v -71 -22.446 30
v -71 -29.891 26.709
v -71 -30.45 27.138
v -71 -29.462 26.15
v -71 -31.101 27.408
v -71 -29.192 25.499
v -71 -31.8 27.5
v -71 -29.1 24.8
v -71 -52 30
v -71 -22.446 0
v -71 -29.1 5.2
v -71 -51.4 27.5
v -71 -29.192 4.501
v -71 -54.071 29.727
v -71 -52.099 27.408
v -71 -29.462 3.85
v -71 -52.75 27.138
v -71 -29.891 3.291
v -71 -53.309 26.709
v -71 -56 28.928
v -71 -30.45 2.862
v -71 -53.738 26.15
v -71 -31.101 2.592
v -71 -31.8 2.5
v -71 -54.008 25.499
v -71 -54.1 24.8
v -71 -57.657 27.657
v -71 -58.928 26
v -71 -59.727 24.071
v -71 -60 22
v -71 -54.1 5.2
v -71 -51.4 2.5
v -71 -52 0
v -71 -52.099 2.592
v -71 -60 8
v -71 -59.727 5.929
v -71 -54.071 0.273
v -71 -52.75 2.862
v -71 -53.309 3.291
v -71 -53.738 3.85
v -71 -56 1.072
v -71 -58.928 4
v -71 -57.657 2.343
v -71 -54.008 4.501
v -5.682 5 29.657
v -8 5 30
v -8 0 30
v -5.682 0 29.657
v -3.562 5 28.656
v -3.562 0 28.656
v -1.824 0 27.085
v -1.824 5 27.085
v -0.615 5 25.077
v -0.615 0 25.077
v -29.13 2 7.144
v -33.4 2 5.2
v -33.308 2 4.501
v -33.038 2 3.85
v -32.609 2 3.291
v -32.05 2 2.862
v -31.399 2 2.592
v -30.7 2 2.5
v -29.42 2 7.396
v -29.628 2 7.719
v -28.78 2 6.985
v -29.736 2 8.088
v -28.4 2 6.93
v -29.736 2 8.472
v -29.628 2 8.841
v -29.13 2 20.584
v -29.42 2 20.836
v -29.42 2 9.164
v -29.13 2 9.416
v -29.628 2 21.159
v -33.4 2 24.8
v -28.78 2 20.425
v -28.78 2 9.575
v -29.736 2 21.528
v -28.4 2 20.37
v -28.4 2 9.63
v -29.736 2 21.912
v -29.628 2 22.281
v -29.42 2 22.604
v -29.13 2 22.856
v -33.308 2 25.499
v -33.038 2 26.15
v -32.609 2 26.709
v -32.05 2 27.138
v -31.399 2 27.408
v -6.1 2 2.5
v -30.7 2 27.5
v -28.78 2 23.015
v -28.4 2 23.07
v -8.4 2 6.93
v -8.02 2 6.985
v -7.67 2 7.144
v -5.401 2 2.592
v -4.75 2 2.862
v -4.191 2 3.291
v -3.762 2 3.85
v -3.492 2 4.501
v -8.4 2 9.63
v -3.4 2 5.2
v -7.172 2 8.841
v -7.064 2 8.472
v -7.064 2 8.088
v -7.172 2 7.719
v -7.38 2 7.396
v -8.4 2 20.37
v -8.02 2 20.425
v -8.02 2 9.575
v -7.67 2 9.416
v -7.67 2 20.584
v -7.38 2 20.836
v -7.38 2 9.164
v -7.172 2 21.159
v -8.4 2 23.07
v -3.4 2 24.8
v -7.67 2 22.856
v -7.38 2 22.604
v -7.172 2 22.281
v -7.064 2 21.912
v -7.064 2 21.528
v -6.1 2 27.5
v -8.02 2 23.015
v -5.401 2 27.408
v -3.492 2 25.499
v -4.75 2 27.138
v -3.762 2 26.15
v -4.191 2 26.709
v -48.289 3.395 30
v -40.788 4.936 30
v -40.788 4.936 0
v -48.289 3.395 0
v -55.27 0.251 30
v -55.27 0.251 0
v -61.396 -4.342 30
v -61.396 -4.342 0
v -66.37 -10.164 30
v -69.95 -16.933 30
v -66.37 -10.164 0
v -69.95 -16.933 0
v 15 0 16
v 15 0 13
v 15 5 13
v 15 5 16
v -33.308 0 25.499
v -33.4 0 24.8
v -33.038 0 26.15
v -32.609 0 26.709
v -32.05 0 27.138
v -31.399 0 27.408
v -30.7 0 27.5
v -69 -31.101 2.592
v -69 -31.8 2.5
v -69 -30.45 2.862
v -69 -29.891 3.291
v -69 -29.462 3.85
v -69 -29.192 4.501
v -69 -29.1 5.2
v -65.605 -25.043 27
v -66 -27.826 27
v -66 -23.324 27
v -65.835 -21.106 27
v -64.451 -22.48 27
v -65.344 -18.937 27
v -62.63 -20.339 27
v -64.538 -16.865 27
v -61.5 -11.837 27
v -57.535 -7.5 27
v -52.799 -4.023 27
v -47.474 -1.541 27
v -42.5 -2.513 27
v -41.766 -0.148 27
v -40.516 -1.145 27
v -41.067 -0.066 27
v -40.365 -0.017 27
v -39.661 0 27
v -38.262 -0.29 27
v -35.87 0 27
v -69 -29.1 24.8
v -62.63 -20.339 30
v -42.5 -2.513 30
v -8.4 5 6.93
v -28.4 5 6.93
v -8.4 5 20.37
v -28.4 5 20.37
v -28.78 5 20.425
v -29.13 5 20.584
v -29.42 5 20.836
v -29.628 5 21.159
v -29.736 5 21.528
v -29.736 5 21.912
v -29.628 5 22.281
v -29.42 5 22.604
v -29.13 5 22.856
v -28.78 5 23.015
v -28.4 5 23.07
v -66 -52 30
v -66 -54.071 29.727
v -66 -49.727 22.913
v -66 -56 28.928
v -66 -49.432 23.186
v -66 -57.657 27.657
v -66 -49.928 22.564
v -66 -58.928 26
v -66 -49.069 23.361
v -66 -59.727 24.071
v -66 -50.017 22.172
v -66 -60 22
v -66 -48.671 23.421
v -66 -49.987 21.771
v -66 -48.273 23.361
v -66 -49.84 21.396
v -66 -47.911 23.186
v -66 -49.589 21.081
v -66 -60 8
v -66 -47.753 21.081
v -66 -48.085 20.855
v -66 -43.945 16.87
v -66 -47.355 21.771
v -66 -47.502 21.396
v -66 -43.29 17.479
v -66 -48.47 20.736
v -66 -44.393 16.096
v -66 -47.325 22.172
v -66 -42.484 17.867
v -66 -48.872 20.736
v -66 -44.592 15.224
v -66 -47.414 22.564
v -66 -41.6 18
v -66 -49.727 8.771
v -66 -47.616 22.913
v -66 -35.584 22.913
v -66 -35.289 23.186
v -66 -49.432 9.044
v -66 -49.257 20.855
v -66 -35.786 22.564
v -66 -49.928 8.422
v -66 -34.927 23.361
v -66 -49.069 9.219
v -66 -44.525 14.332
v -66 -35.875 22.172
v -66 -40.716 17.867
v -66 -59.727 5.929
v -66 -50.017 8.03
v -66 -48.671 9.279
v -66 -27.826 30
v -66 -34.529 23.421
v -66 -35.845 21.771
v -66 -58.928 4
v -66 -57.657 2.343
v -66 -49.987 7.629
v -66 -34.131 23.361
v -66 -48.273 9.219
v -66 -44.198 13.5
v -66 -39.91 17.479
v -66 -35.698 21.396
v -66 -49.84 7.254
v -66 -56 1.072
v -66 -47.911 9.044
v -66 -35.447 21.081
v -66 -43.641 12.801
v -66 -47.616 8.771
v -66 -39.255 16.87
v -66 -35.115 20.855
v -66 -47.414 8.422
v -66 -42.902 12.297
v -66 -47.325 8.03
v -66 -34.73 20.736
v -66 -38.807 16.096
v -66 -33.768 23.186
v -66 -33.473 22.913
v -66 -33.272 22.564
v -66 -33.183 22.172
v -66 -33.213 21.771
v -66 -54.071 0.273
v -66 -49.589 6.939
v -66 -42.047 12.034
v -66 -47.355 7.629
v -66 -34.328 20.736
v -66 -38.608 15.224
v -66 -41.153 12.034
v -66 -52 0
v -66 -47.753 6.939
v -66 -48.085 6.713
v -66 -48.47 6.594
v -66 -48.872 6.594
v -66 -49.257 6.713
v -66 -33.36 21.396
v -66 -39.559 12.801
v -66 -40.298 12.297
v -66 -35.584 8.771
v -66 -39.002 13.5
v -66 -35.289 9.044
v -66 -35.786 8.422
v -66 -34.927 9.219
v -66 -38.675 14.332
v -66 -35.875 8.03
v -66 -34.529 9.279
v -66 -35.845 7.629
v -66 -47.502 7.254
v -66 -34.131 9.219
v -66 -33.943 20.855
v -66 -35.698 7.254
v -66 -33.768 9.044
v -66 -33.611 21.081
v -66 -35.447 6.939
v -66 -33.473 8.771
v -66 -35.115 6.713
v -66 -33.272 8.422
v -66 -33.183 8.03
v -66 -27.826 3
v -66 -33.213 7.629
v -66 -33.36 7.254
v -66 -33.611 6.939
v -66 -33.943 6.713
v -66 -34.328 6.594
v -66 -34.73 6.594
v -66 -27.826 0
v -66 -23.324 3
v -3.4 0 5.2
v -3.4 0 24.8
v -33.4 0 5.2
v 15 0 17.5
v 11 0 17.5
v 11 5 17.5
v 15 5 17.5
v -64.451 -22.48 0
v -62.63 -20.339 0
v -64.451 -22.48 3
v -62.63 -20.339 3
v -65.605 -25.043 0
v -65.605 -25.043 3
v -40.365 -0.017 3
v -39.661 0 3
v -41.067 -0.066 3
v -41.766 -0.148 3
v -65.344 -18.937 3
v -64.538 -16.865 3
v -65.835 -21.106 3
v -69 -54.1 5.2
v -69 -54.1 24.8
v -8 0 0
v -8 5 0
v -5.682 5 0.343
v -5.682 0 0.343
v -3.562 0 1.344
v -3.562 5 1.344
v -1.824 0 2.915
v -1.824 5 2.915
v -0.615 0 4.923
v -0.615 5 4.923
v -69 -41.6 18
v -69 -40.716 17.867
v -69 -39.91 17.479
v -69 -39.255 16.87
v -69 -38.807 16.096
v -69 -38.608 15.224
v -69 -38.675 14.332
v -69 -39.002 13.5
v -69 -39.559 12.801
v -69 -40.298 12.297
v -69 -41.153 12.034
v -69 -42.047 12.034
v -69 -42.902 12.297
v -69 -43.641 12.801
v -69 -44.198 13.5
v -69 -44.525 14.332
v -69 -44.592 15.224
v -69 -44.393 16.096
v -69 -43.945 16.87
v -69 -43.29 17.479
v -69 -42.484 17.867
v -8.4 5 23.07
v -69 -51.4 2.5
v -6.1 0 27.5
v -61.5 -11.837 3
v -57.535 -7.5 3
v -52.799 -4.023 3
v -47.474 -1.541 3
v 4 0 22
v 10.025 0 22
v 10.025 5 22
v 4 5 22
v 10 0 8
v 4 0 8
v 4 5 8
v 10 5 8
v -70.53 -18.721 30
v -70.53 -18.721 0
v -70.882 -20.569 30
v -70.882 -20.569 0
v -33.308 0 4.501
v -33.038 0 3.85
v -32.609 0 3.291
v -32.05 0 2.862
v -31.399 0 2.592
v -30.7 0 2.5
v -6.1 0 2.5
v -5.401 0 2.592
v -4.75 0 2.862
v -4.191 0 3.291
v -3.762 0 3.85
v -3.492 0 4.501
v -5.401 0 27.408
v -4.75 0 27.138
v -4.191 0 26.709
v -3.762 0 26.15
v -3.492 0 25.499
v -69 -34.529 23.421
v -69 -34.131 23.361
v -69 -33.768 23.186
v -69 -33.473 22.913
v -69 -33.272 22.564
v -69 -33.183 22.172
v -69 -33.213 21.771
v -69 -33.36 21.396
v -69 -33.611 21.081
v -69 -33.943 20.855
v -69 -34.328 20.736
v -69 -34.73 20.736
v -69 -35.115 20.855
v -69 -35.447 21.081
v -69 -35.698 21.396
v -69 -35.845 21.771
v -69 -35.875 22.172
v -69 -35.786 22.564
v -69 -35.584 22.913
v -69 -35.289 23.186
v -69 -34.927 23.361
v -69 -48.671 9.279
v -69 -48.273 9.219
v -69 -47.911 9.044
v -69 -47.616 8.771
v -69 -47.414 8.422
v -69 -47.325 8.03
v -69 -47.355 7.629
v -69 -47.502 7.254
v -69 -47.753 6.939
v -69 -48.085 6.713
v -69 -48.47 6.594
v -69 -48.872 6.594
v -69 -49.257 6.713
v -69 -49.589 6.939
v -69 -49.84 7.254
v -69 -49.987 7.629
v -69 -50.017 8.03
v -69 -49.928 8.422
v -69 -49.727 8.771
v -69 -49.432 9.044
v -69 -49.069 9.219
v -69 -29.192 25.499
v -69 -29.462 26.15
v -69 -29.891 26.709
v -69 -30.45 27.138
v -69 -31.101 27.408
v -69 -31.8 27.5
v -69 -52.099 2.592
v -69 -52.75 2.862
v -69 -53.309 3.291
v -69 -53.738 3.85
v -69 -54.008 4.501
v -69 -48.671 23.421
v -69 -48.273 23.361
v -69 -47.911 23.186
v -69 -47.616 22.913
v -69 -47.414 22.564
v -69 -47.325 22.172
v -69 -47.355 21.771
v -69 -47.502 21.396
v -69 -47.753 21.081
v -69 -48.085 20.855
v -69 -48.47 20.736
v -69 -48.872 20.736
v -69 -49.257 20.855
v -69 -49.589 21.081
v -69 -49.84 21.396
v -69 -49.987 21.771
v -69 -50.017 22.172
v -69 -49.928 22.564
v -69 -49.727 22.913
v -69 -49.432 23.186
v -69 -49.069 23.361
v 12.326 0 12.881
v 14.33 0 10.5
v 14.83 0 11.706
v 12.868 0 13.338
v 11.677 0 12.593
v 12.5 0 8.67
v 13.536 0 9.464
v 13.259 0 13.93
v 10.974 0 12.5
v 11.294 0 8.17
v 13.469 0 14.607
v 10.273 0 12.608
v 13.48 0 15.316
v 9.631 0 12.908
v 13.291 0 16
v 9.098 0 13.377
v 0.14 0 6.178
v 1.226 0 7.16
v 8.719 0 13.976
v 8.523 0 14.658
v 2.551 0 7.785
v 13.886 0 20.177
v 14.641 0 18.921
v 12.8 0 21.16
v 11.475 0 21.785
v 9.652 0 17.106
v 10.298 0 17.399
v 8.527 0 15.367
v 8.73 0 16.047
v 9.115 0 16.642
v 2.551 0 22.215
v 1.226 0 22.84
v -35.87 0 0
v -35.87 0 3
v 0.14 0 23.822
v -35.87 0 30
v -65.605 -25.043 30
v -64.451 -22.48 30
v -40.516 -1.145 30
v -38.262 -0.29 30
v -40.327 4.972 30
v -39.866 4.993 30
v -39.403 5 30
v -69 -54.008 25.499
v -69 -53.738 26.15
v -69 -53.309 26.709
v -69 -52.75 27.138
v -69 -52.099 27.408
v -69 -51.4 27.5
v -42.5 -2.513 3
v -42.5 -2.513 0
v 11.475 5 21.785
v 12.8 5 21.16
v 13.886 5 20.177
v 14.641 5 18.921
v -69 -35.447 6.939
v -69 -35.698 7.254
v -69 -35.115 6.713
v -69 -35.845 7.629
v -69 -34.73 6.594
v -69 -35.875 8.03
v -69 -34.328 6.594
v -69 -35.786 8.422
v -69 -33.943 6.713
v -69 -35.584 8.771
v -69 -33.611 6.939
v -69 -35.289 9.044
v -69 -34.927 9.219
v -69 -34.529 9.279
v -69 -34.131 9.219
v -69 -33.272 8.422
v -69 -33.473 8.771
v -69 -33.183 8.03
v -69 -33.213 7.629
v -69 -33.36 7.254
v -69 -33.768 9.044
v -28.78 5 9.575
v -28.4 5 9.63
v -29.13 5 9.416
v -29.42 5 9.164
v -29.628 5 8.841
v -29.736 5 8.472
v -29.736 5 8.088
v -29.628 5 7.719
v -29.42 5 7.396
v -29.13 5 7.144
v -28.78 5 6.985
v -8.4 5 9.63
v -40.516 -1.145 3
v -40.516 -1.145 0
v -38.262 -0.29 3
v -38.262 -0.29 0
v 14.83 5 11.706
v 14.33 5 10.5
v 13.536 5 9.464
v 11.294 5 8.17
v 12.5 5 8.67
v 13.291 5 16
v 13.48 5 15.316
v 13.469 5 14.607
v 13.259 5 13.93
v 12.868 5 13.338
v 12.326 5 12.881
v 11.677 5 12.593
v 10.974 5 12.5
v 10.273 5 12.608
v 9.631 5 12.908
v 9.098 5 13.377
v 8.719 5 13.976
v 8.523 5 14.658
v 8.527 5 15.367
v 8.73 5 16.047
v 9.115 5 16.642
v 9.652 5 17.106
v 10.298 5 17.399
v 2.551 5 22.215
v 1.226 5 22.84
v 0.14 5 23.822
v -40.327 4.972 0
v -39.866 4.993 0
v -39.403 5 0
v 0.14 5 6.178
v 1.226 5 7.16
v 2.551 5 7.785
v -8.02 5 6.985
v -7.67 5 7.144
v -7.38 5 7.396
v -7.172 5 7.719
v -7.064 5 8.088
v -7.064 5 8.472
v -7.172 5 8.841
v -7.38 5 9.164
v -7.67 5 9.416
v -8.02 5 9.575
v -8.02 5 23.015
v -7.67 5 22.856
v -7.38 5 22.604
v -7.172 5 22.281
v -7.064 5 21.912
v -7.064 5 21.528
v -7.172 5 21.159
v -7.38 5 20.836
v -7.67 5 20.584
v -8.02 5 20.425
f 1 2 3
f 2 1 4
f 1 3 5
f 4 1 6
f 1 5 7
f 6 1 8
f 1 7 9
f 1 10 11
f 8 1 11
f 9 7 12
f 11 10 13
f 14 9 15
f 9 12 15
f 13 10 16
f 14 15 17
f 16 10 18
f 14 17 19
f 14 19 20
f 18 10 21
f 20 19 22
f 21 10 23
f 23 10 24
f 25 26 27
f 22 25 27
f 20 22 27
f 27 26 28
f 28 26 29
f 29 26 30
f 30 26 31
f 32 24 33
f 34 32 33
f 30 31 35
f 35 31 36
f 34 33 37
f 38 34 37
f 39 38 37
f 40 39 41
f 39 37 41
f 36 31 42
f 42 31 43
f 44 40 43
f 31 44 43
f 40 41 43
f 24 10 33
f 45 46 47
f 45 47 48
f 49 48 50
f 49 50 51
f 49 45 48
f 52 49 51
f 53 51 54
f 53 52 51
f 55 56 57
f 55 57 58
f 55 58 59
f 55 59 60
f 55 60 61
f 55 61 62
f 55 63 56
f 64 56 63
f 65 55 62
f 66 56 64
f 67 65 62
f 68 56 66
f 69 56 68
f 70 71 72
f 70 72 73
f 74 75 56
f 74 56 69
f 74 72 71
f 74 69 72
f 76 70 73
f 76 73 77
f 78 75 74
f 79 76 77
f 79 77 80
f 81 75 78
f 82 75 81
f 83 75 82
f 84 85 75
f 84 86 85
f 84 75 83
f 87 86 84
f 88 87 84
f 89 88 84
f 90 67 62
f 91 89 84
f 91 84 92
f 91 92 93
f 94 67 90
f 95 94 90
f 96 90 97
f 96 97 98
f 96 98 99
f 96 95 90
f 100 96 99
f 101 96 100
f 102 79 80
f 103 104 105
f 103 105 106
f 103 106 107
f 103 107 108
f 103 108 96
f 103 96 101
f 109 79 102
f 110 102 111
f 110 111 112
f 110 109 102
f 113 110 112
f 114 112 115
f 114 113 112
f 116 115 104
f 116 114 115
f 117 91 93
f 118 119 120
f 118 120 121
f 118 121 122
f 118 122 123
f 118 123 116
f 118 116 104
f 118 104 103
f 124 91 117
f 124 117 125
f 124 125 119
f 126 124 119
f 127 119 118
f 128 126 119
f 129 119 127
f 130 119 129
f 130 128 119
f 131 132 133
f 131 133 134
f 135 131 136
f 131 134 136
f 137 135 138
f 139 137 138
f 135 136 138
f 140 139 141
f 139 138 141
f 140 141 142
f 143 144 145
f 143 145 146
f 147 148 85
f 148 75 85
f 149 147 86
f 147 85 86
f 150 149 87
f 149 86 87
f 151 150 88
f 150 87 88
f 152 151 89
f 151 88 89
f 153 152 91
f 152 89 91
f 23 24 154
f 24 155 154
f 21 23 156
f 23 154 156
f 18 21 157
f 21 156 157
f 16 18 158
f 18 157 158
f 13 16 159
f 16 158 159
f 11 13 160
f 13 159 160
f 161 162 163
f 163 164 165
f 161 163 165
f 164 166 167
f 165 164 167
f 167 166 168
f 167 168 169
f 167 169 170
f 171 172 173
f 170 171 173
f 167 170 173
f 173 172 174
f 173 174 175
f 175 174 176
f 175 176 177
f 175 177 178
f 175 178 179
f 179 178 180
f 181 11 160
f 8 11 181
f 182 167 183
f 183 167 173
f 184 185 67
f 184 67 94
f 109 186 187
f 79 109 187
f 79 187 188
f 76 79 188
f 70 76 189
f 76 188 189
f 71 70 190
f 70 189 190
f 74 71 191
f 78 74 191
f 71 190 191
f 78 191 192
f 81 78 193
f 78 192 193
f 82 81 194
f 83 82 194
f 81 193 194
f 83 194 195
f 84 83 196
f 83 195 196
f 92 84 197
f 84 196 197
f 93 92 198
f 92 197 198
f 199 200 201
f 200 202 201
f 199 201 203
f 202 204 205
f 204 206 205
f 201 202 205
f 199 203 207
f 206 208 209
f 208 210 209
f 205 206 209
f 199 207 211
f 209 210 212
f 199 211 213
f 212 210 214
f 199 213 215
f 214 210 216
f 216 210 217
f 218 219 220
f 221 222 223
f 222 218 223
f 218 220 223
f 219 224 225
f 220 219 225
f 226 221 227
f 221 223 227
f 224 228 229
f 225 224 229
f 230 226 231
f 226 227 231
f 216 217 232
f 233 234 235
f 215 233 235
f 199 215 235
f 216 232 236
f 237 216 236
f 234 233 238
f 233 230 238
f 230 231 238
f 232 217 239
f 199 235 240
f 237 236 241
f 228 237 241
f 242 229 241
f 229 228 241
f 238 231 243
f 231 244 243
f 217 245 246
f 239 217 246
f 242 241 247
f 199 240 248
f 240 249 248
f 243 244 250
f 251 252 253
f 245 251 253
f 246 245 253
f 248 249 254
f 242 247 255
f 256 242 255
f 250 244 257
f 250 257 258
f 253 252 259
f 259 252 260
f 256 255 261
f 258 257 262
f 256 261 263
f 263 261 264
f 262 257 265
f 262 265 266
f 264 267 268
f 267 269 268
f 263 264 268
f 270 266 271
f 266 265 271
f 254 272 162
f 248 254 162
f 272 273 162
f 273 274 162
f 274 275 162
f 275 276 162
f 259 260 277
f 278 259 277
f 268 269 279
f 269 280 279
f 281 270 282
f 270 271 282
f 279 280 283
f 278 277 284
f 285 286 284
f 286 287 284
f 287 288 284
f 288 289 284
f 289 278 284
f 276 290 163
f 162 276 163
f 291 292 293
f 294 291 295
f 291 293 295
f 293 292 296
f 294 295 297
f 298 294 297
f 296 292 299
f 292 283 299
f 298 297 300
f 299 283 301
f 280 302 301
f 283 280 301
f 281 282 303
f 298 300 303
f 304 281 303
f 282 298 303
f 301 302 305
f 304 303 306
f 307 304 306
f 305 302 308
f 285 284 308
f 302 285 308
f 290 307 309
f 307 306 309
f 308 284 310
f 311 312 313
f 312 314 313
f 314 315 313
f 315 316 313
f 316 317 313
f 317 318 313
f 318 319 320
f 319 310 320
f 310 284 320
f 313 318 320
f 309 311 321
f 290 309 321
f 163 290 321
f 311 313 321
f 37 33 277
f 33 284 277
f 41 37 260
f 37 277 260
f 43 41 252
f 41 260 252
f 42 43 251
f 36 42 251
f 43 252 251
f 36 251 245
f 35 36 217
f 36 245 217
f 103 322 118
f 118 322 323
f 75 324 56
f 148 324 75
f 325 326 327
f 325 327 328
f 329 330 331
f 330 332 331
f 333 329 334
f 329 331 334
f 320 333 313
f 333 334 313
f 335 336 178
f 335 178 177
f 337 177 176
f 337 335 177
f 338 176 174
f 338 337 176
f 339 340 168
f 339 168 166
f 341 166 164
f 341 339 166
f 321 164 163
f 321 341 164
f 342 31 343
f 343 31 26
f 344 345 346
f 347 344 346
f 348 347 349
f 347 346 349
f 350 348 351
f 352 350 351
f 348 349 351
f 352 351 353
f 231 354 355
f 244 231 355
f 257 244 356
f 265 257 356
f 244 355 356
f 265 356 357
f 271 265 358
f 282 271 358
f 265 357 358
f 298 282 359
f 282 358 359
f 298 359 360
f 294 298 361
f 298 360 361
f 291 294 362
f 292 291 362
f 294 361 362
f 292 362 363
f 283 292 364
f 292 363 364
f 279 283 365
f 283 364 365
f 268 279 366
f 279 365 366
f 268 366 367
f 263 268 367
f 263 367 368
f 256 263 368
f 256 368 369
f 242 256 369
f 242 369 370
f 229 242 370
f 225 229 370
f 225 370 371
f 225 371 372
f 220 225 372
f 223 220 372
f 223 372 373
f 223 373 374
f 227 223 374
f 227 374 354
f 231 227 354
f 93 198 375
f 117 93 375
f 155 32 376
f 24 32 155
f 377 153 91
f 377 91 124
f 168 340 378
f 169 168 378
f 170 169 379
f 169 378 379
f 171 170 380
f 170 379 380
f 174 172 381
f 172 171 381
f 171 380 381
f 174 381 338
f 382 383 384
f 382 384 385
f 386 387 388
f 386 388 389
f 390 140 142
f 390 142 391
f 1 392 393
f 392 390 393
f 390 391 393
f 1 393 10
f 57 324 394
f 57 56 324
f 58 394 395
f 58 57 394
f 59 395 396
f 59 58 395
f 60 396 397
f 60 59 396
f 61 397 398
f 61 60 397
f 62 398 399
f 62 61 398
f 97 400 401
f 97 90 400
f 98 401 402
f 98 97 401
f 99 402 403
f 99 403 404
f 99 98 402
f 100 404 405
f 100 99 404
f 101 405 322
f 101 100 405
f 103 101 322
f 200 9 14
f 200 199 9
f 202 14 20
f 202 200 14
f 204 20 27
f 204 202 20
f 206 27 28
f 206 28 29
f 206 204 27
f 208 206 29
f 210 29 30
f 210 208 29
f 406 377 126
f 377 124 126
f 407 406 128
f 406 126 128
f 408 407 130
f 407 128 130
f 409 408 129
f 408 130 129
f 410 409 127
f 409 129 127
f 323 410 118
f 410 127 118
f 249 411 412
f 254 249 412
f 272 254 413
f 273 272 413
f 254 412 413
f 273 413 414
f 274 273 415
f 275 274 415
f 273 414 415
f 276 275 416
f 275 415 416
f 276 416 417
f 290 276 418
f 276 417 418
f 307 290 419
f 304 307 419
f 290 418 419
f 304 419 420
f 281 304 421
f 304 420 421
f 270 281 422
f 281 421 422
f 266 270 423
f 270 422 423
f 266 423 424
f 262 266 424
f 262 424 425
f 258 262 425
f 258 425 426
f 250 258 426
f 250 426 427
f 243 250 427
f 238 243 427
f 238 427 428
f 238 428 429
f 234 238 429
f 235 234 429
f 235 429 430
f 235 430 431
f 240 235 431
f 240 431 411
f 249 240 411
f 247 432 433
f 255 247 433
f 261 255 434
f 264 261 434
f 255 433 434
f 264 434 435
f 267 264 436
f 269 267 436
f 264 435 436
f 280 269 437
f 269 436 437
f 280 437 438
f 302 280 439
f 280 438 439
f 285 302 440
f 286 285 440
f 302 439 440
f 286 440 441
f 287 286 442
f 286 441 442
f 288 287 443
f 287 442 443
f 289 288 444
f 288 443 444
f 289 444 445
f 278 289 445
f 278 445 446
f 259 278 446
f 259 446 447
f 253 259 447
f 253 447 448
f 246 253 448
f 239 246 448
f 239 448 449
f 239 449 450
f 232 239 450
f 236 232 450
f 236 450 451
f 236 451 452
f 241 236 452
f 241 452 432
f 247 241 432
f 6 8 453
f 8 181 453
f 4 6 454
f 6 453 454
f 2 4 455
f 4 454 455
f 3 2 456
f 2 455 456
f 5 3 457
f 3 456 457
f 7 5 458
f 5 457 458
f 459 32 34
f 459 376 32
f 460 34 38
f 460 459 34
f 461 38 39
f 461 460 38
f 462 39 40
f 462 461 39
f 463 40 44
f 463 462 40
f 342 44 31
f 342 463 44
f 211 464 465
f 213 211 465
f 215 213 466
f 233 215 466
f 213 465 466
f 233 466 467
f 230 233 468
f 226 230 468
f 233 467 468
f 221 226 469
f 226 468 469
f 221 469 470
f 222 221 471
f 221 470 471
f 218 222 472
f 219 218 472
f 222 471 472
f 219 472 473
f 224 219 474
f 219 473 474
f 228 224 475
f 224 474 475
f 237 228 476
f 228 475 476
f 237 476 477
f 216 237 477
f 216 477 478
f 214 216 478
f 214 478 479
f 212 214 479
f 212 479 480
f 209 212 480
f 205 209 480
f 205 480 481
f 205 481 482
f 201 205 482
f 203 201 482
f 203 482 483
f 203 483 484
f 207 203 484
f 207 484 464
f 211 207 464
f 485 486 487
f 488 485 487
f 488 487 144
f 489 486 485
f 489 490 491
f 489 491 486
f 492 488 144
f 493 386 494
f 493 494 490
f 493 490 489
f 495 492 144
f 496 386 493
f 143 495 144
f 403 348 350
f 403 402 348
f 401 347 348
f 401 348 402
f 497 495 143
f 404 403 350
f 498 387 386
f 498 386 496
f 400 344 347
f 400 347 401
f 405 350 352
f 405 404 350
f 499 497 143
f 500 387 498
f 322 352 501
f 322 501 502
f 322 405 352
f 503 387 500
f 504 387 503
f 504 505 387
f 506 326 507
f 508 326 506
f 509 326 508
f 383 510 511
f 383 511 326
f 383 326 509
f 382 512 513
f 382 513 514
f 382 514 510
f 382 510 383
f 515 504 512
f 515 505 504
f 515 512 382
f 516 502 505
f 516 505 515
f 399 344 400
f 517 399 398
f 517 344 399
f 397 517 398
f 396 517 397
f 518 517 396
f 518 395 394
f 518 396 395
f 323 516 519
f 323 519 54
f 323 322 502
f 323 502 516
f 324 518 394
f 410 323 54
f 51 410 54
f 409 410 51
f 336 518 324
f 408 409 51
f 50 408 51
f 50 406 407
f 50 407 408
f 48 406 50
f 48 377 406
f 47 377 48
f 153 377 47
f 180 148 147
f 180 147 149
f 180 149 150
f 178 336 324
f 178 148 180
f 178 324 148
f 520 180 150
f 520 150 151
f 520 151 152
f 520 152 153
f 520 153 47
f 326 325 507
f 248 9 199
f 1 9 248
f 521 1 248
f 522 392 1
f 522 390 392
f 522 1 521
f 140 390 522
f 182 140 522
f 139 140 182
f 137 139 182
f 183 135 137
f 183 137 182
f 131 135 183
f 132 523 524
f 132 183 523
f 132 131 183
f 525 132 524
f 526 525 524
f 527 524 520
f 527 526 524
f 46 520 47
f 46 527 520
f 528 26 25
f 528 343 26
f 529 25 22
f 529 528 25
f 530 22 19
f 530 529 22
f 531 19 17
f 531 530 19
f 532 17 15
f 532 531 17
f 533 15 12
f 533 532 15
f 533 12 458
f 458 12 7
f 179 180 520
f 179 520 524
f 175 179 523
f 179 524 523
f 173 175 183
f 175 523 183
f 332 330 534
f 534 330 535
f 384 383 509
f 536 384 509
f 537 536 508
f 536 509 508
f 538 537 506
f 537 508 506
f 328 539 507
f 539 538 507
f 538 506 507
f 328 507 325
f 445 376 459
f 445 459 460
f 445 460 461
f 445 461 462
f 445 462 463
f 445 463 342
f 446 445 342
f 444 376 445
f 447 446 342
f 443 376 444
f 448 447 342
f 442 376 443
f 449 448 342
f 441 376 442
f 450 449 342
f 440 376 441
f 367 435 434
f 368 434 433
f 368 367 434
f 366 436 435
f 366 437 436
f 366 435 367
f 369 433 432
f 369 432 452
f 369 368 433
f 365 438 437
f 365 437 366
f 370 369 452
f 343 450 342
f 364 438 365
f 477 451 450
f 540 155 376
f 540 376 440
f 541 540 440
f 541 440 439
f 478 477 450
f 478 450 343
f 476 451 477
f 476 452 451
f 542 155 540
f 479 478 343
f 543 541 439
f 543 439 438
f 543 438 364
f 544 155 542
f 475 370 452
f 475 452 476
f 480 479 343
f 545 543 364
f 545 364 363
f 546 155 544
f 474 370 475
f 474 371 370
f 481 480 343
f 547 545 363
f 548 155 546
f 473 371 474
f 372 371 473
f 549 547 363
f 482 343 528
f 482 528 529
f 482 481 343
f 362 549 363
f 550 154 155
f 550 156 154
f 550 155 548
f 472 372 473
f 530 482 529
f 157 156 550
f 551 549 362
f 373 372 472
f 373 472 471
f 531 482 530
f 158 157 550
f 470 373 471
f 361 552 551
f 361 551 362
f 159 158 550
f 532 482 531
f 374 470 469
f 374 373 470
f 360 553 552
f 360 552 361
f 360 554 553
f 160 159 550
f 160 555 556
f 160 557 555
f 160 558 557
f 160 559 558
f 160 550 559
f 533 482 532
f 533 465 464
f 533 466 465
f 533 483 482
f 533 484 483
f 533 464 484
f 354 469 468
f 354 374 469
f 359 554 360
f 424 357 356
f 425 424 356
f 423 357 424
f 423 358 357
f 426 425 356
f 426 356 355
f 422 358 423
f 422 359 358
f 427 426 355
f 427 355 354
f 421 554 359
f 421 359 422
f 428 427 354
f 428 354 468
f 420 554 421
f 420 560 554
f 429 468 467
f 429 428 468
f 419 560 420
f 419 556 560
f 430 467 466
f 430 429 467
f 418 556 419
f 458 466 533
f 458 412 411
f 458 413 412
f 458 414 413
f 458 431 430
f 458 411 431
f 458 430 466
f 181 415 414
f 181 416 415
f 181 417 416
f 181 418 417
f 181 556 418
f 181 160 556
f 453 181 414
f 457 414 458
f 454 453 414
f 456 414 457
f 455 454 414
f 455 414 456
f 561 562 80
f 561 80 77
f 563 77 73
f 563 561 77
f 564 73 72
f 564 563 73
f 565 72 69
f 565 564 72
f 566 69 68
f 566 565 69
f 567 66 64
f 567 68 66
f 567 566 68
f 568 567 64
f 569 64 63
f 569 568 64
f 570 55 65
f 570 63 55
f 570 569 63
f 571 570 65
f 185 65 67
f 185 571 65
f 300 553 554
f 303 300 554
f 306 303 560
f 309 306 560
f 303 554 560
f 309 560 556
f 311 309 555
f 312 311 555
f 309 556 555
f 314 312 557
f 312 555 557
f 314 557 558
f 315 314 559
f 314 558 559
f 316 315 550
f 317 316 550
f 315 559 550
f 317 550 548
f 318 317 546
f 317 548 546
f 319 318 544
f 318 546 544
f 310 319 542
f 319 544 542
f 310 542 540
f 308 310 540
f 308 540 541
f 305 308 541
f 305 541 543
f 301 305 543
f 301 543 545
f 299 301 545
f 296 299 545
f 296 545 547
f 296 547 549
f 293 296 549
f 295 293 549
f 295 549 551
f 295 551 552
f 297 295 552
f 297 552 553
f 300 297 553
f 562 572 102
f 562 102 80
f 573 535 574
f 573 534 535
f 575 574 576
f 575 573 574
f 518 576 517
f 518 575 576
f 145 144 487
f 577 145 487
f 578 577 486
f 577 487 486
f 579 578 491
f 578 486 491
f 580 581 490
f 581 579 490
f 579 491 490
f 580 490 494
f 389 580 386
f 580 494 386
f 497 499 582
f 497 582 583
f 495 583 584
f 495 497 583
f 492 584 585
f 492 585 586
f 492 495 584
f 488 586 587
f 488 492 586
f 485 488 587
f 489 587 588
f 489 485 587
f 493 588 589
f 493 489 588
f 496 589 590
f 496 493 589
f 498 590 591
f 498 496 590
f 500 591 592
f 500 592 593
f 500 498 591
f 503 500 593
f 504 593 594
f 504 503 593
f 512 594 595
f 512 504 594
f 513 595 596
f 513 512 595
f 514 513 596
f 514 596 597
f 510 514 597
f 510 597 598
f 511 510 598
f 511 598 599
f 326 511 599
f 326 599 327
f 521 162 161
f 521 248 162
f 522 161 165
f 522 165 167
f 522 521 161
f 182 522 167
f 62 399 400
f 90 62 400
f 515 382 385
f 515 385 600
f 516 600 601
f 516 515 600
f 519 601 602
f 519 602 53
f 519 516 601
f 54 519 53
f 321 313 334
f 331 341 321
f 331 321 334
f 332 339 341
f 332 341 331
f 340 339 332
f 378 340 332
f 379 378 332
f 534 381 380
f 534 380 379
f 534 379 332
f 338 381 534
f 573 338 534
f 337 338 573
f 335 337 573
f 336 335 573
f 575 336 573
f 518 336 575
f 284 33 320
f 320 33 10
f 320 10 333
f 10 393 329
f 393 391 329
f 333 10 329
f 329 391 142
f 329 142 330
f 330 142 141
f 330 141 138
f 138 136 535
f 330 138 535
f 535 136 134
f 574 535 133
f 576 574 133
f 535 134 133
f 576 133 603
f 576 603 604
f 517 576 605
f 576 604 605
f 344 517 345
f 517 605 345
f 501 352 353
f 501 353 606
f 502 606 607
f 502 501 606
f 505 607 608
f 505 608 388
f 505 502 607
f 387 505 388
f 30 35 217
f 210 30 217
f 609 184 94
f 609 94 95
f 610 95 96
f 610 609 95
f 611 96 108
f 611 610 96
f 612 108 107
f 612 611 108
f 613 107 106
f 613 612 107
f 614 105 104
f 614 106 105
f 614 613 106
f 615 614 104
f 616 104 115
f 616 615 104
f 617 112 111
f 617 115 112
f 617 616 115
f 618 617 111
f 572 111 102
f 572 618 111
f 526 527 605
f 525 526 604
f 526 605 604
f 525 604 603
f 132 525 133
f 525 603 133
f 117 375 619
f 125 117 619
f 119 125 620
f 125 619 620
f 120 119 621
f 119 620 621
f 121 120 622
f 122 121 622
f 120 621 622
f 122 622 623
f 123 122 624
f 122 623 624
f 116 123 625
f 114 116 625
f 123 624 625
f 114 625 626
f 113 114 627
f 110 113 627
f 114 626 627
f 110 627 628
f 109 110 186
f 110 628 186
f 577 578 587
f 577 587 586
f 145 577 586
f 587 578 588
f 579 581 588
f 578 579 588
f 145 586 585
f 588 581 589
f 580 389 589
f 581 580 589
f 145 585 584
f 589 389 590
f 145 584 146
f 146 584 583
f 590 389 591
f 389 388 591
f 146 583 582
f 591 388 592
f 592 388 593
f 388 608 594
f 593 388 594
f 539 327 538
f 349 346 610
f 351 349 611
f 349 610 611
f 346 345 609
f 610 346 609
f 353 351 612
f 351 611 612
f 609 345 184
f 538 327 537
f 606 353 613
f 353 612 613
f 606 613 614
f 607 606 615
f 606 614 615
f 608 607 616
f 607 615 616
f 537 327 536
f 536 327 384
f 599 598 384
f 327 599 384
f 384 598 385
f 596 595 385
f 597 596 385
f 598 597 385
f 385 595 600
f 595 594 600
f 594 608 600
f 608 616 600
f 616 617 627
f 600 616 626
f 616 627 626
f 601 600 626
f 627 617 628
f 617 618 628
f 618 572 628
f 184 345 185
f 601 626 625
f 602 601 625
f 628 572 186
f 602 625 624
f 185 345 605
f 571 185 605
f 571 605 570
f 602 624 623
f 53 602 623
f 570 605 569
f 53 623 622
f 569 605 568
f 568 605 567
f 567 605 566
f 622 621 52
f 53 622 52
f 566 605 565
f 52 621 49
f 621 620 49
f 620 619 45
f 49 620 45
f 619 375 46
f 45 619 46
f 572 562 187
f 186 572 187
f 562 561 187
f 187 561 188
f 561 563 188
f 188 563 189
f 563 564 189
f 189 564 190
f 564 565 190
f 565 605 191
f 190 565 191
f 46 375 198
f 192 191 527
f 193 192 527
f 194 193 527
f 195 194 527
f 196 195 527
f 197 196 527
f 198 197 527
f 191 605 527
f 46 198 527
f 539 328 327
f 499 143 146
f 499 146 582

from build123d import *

# Parameters (mm, degrees)
SALIENTE_EXTRUIR1_DEPTH = 30
CORTAR_EXTRUIR1_DEPTH   = 5
CROQUIS3_W              = 30
CROQUIS3_H              = 25
CORTAR_EXTRUIR2_DEPTH   = 2
CROQUIS4_R              = 1.35
CROQUIS4_R_2            = 3
CORTAR_EXTRUIR3_DEPTH   = 5
CROQUIS5_W              = 25
CROQUIS5_H              = 25
CORTAR_EXTRUIR4_DEPTH   = 2
REDONDEO1_R             = 15
REDONDEO2_R             = 8
REDONDEO3_R             = 2.7
SALIENTE_EXTRUIR2_DEPTH = 5
REDONDEO4_R             = 5
SALIENTE_EXTRUIR3_START = -3
SALIENTE_EXTRUIR3_DEPTH = 3
SALIENTE_EXTRUIR4_START = -30
SALIENTE_EXTRUIR4_DEPTH = 3
REDONDEO5_R             = 10


with BuildPart() as part:
    # Croquis1 → Saliente-Extruir1 (new body)
    with BuildSketch(Plane.XY):
        with BuildLine():
            Line((0, 0), (0, 5))
            Line((0, 5), (-40, 5))
            ThreePointArc((-40, 5), (-59.427874629, -2.62943546), (-71, -20))
            Line((-71, -20), (-71, -60))
            Line((-71, -60), (-66, -60))
            Line((-66, -60), (-66, -20.535714286))
            ThreePointArc((-66, -20.535714286), (-56.328368106, -6.472823549), (-40.535714286, 0))
            Line((-40.535714286, 0), (0, 0))
        make_face()
    extrude(amount=SALIENTE_EXTRUIR1_DEPTH)

    # Croquis2 → Cortar-Extruir1 (cut)
    with BuildSketch(Plane(origin=(0, 5, 0), x_dir=(1, 0, 0), z_dir=(0, 1, 0))):
        with BuildLine():
            Line((-18.4, -6.93), (-8.4, -6.93))
            ThreePointArc((-8.4, -6.93), (-7.05, -8.28), (-8.4, -9.63))
            Line((-8.4, -9.63), (-28.4, -9.63))
            ThreePointArc((-28.4, -9.63), (-29.75, -8.28), (-28.4, -6.93))
            Line((-28.4, -6.93), (-18.4, -6.93))
        make_face()
        with BuildLine():
            Line((-8.4, -20.37), (-28.4, -20.37))
            ThreePointArc((-28.4, -20.37), (-29.75, -21.72), (-28.4, -23.07))
            Line((-28.4, -23.07), (-18.4, -23.07))
            Line((-18.4, -23.07), (-8.4, -23.07))
            ThreePointArc((-8.4, -23.07), (-7.05, -21.72), (-8.4, -20.37))
        make_face()
    extrude(amount=-CORTAR_EXTRUIR1_DEPTH, mode=Mode.SUBTRACT)

    # Croquis3 → Cortar-Extruir2 (cut)
    with BuildSketch(Plane.XZ):
        with Locations((-18.4, 15)):
            Rectangle(CROQUIS3_W, CROQUIS3_H)
    extrude(amount=-CORTAR_EXTRUIR2_DEPTH, mode=Mode.SUBTRACT)

    # Croquis4 → Cortar-Extruir3 (cut)
    with BuildSketch(Plane.ZY.offset(71)):
        with Locations((22.071067812, -34.528932188)):
            Circle(CROQUIS4_R)
        with Locations((22.071067812, -48.671067812)):
            Circle(CROQUIS4_R)
        with Locations((7.928932188, -48.671067812)):
            Circle(CROQUIS4_R)
        with Locations((7.928932188, -34.528932188)):
            Circle(CROQUIS4_R)
        with Locations((15, -41.6)):
            Circle(CROQUIS4_R_2)
    extrude(amount=-CORTAR_EXTRUIR3_DEPTH, mode=Mode.SUBTRACT)

    # Croquis5 → Cortar-Extruir4 (cut)
    with BuildSketch(Plane.ZY.offset(71)):
        with Locations((15, -41.6)):
            Rectangle(CROQUIS5_W, CROQUIS5_H)
    extrude(amount=-CORTAR_EXTRUIR4_DEPTH, mode=Mode.SUBTRACT)

    # Redondeo1
    # the kernel refuses this fillet: 15 mm, written as the material it adds along each edge
    with BuildSketch(Plane(origin=(-40.535714286, 0, 0), x_dir=(-0.9928040160487852, -0.11975051447657076, 0), z_dir=(0, 0, 1))) as redondeo1_piece_1:
        with BuildLine():
            CenterArc((0.928120739, 14.996773606), REDONDEO1_R, 263.122295715, 8.066092884)
            Line((-0.868136978, 0.104713365), (0, 0))
            ThreePointArc((0, 0), (0.61960892, -0.006425976), (1.23921784, 0))
        make_face()
    extrude(amount=30)
    with BuildSketch(Plane(origin=(-66, -20.535714286, 0), x_dir=(0, -1, 0), z_dir=(0, 0, 1))) as redondeo1_piece_2:
        with BuildLine():
            CenterArc((2.787806423, 15), REDONDEO1_R, 244.497181261, 25.502818739)
            ThreePointArc((-3.670526079, 1.461538444), (-1.859449277, 0.670027601), (0, 0))
            Line((0, 0), (2.787806423, 0))
        make_face()
    extrude(amount=30)
    # the kernel refuses this fillet: 15 mm, written as the material it takes off along each edge
    with BuildSketch(Plane(origin=(-71, -20, -8.10538424), x_dir=(0, -1, 0), z_dir=(0, 0, 1))) as redondeo1_2_piece_1:
        with BuildLine():
            CenterArc((2.445891068, 15), REDONDEO1_R, 248.435113489, 21.564886511)
            ThreePointArc((-3.067429039, 1.049971276), (-1.545944268, 0.48925715), (0, 0))
            Line((0, 0), (2.445891068, 0))
        make_face()
    extrude(amount=46.210768479, mode=Mode.SUBTRACT)
    with BuildSketch(Plane(origin=(-40, 5, -1.977224952), x_dir=(-0.9967130662310812, -0.08101273729628075, 0), z_dir=(0, 0, 1))) as redondeo1_2_piece_2:
        with BuildLine():
            CenterArc((0.620502289, 14.999032237), REDONDEO1_R, 265.35321973, 5.297627307)
            Line((-0.59468877, 0.048336243), (0, 0))
            ThreePointArc((0, 0), (0.39544499, -0.002246038), (0.790889981, 0))
        make_face()
    extrude(amount=33.954449904, mode=Mode.SUBTRACT)

    # Redondeo2
    redondeo2_edges = [part.edges().sort_by_distance(p)[0] for p in [
        (0, 2.5, 0),
        (-68.5, -60, 30),
        (0, 2.5, 30),
        (-68.5, -60, 0),
    ]]
    fillet(redondeo2_edges, radius=REDONDEO2_R)

    # Redondeo3
    redondeo3_edges = [part.edges().sort_by_distance(p)[0] for p in [
        (-70, -29.1, 27.5),
        (-70, -54.1, 27.5),
        (-70, -54.1, 2.5),
        (-70, -29.1, 2.5),
        (-3.4, 1, 27.5),
        (-3.4, 1, 2.5),
        (-33.4, 1, 2.5),
        (-33.4, 1, 27.5),
    ]]
    fillet(redondeo3_edges, radius=REDONDEO3_R)

    # Croquis6 → Saliente-Extruir2 (add)
    with BuildSketch(Plane.XZ):
        with BuildLine():
            Line((0, 22), (0, 8))
            Line((0, 8), (15, 8))
            Line((15, 8), (15, 16))
            Line((15, 16), (13.291287847, 16))
            ThreePointArc((13.291287847, 16), (9.630693606, 12.908349934), (11, 17.5))
            Line((11, 17.5), (15, 17.5))
            Line((15, 17.5), (15, 22))
            Line((15, 22), (0, 22))
        make_face()
    extrude(amount=-SALIENTE_EXTRUIR2_DEPTH)

    # Redondeo4
    # the kernel refuses this fillet: 5 mm, written as the material it adds along each edge
    with BuildSketch(Plane(origin=(0, 0, 22), x_dir=(-0.19611613513818366, 0, 0.9805806756909203), z_dir=(0, 1, 0))) as redondeo4_piece_1:
        with BuildLine():
            CenterArc((4.118438838, 4.902903378), REDONDEO4_R, 191.309932474, 67.380135052)
            Line((-0.784464541, 3.922322703), (0, 0))
            ThreePointArc((0, 0), (1.568929081, 0.155354594), (3.137858162, 0))
        make_face()
    extrude(amount=5)
    with BuildSketch(Plane(origin=(0, 0, 8), x_dir=(-0.19611613513818402, 0, -0.9805806756909201), z_dir=(0, 1, 0))) as redondeo4_piece_2:
        with BuildLine():
            CenterArc((4.118438838, -4.902903378), REDONDEO4_R, 101.309932474, 67.380135052)
            Line((-0.784464541, -3.922322703), (0, 0))
            ThreePointArc((0, 0), (1.568929081, -0.155354594), (3.137858162, 0))
        make_face()
    extrude(amount=5)
    # the kernel refuses this fillet: 5 mm, written as the material it takes off along each edge
    with BuildSketch(Plane(origin=(15, -12.437342964, 22), x_dir=(-1, 0, 0), z_dir=(0, 1, 0))) as redondeo4_2_piece_1:
        with BuildLine():
            CenterArc((4.974937186, -5), REDONDEO4_R, 90, 84.260829523)
            Line((0, -4.5), (0, 0))
            Line((0, 0), (4.974937186, 0))
        make_face()
    extrude(amount=29.874685928, mode=Mode.SUBTRACT)
    with BuildSketch(Plane(origin=(15, -12.5, 8), x_dir=(0, 0, 1), z_dir=(0, 1, 0))) as redondeo4_2_piece_2:
        with BuildLine():
            CenterArc((REDONDEO4_R, -REDONDEO4_R), REDONDEO4_R, 90, 90)
            Line((0, -REDONDEO4_R), (0, 0))
            Line((0, 0), (REDONDEO4_R, 0))
        make_face()
    extrude(amount=30, mode=Mode.SUBTRACT)

    # Croquis9 → Saliente-Extruir3 (add)
    with BuildSketch(Plane.XY.offset(30).offset(SALIENTE_EXTRUIR3_START)):
        with BuildLine():
            Line((-66, -23.323520708), (-39.661284928, 0))
            ThreePointArc((-39.661284928, 0), (-40.716262324, -0.037145236), (-41.766014734, -0.148396974))
            ThreePointArc((-41.766014734, -0.148396974), (-55.25292739, -5.645128922), (-64.538461556, -16.865188206))
            ThreePointArc((-64.538461556, -16.865188206), (-65.630053372, -20.01269931), (-66, -23.323520708))
        make_face()
    extrude(amount=SALIENTE_EXTRUIR3_DEPTH)

    # Croquis9<2> → Saliente-Extruir4 (add)
    with BuildSketch(Plane.XY.offset(30).offset(SALIENTE_EXTRUIR4_START)):
        with BuildLine():
            Line((-66, -23.323520708), (-39.661284928, 0))
            ThreePointArc((-39.661284928, 0), (-40.716262324, -0.037145236), (-41.766014734, -0.148396974))
            ThreePointArc((-41.766014734, -0.148396974), (-55.25292739, -5.645128922), (-64.538461556, -16.865188206))
            ThreePointArc((-64.538461556, -16.865188206), (-65.630053372, -20.01269931), (-66, -23.323520708))
        make_face()
    extrude(amount=SALIENTE_EXTRUIR4_DEPTH)

    # Redondeo5
    redondeo5_edges = [part.edges().sort_by_distance(p)[0] for p in [
        (-39.661284928, 0, 28.5),
        (-66, -23.323520708, 1.5),
        (-66, -23.323520708, 28.5),
        (-39.661284928, 0, 1.5),
    ]]
    fillet(redondeo5_edges, radius=REDONDEO5_R)


solid = part.part
